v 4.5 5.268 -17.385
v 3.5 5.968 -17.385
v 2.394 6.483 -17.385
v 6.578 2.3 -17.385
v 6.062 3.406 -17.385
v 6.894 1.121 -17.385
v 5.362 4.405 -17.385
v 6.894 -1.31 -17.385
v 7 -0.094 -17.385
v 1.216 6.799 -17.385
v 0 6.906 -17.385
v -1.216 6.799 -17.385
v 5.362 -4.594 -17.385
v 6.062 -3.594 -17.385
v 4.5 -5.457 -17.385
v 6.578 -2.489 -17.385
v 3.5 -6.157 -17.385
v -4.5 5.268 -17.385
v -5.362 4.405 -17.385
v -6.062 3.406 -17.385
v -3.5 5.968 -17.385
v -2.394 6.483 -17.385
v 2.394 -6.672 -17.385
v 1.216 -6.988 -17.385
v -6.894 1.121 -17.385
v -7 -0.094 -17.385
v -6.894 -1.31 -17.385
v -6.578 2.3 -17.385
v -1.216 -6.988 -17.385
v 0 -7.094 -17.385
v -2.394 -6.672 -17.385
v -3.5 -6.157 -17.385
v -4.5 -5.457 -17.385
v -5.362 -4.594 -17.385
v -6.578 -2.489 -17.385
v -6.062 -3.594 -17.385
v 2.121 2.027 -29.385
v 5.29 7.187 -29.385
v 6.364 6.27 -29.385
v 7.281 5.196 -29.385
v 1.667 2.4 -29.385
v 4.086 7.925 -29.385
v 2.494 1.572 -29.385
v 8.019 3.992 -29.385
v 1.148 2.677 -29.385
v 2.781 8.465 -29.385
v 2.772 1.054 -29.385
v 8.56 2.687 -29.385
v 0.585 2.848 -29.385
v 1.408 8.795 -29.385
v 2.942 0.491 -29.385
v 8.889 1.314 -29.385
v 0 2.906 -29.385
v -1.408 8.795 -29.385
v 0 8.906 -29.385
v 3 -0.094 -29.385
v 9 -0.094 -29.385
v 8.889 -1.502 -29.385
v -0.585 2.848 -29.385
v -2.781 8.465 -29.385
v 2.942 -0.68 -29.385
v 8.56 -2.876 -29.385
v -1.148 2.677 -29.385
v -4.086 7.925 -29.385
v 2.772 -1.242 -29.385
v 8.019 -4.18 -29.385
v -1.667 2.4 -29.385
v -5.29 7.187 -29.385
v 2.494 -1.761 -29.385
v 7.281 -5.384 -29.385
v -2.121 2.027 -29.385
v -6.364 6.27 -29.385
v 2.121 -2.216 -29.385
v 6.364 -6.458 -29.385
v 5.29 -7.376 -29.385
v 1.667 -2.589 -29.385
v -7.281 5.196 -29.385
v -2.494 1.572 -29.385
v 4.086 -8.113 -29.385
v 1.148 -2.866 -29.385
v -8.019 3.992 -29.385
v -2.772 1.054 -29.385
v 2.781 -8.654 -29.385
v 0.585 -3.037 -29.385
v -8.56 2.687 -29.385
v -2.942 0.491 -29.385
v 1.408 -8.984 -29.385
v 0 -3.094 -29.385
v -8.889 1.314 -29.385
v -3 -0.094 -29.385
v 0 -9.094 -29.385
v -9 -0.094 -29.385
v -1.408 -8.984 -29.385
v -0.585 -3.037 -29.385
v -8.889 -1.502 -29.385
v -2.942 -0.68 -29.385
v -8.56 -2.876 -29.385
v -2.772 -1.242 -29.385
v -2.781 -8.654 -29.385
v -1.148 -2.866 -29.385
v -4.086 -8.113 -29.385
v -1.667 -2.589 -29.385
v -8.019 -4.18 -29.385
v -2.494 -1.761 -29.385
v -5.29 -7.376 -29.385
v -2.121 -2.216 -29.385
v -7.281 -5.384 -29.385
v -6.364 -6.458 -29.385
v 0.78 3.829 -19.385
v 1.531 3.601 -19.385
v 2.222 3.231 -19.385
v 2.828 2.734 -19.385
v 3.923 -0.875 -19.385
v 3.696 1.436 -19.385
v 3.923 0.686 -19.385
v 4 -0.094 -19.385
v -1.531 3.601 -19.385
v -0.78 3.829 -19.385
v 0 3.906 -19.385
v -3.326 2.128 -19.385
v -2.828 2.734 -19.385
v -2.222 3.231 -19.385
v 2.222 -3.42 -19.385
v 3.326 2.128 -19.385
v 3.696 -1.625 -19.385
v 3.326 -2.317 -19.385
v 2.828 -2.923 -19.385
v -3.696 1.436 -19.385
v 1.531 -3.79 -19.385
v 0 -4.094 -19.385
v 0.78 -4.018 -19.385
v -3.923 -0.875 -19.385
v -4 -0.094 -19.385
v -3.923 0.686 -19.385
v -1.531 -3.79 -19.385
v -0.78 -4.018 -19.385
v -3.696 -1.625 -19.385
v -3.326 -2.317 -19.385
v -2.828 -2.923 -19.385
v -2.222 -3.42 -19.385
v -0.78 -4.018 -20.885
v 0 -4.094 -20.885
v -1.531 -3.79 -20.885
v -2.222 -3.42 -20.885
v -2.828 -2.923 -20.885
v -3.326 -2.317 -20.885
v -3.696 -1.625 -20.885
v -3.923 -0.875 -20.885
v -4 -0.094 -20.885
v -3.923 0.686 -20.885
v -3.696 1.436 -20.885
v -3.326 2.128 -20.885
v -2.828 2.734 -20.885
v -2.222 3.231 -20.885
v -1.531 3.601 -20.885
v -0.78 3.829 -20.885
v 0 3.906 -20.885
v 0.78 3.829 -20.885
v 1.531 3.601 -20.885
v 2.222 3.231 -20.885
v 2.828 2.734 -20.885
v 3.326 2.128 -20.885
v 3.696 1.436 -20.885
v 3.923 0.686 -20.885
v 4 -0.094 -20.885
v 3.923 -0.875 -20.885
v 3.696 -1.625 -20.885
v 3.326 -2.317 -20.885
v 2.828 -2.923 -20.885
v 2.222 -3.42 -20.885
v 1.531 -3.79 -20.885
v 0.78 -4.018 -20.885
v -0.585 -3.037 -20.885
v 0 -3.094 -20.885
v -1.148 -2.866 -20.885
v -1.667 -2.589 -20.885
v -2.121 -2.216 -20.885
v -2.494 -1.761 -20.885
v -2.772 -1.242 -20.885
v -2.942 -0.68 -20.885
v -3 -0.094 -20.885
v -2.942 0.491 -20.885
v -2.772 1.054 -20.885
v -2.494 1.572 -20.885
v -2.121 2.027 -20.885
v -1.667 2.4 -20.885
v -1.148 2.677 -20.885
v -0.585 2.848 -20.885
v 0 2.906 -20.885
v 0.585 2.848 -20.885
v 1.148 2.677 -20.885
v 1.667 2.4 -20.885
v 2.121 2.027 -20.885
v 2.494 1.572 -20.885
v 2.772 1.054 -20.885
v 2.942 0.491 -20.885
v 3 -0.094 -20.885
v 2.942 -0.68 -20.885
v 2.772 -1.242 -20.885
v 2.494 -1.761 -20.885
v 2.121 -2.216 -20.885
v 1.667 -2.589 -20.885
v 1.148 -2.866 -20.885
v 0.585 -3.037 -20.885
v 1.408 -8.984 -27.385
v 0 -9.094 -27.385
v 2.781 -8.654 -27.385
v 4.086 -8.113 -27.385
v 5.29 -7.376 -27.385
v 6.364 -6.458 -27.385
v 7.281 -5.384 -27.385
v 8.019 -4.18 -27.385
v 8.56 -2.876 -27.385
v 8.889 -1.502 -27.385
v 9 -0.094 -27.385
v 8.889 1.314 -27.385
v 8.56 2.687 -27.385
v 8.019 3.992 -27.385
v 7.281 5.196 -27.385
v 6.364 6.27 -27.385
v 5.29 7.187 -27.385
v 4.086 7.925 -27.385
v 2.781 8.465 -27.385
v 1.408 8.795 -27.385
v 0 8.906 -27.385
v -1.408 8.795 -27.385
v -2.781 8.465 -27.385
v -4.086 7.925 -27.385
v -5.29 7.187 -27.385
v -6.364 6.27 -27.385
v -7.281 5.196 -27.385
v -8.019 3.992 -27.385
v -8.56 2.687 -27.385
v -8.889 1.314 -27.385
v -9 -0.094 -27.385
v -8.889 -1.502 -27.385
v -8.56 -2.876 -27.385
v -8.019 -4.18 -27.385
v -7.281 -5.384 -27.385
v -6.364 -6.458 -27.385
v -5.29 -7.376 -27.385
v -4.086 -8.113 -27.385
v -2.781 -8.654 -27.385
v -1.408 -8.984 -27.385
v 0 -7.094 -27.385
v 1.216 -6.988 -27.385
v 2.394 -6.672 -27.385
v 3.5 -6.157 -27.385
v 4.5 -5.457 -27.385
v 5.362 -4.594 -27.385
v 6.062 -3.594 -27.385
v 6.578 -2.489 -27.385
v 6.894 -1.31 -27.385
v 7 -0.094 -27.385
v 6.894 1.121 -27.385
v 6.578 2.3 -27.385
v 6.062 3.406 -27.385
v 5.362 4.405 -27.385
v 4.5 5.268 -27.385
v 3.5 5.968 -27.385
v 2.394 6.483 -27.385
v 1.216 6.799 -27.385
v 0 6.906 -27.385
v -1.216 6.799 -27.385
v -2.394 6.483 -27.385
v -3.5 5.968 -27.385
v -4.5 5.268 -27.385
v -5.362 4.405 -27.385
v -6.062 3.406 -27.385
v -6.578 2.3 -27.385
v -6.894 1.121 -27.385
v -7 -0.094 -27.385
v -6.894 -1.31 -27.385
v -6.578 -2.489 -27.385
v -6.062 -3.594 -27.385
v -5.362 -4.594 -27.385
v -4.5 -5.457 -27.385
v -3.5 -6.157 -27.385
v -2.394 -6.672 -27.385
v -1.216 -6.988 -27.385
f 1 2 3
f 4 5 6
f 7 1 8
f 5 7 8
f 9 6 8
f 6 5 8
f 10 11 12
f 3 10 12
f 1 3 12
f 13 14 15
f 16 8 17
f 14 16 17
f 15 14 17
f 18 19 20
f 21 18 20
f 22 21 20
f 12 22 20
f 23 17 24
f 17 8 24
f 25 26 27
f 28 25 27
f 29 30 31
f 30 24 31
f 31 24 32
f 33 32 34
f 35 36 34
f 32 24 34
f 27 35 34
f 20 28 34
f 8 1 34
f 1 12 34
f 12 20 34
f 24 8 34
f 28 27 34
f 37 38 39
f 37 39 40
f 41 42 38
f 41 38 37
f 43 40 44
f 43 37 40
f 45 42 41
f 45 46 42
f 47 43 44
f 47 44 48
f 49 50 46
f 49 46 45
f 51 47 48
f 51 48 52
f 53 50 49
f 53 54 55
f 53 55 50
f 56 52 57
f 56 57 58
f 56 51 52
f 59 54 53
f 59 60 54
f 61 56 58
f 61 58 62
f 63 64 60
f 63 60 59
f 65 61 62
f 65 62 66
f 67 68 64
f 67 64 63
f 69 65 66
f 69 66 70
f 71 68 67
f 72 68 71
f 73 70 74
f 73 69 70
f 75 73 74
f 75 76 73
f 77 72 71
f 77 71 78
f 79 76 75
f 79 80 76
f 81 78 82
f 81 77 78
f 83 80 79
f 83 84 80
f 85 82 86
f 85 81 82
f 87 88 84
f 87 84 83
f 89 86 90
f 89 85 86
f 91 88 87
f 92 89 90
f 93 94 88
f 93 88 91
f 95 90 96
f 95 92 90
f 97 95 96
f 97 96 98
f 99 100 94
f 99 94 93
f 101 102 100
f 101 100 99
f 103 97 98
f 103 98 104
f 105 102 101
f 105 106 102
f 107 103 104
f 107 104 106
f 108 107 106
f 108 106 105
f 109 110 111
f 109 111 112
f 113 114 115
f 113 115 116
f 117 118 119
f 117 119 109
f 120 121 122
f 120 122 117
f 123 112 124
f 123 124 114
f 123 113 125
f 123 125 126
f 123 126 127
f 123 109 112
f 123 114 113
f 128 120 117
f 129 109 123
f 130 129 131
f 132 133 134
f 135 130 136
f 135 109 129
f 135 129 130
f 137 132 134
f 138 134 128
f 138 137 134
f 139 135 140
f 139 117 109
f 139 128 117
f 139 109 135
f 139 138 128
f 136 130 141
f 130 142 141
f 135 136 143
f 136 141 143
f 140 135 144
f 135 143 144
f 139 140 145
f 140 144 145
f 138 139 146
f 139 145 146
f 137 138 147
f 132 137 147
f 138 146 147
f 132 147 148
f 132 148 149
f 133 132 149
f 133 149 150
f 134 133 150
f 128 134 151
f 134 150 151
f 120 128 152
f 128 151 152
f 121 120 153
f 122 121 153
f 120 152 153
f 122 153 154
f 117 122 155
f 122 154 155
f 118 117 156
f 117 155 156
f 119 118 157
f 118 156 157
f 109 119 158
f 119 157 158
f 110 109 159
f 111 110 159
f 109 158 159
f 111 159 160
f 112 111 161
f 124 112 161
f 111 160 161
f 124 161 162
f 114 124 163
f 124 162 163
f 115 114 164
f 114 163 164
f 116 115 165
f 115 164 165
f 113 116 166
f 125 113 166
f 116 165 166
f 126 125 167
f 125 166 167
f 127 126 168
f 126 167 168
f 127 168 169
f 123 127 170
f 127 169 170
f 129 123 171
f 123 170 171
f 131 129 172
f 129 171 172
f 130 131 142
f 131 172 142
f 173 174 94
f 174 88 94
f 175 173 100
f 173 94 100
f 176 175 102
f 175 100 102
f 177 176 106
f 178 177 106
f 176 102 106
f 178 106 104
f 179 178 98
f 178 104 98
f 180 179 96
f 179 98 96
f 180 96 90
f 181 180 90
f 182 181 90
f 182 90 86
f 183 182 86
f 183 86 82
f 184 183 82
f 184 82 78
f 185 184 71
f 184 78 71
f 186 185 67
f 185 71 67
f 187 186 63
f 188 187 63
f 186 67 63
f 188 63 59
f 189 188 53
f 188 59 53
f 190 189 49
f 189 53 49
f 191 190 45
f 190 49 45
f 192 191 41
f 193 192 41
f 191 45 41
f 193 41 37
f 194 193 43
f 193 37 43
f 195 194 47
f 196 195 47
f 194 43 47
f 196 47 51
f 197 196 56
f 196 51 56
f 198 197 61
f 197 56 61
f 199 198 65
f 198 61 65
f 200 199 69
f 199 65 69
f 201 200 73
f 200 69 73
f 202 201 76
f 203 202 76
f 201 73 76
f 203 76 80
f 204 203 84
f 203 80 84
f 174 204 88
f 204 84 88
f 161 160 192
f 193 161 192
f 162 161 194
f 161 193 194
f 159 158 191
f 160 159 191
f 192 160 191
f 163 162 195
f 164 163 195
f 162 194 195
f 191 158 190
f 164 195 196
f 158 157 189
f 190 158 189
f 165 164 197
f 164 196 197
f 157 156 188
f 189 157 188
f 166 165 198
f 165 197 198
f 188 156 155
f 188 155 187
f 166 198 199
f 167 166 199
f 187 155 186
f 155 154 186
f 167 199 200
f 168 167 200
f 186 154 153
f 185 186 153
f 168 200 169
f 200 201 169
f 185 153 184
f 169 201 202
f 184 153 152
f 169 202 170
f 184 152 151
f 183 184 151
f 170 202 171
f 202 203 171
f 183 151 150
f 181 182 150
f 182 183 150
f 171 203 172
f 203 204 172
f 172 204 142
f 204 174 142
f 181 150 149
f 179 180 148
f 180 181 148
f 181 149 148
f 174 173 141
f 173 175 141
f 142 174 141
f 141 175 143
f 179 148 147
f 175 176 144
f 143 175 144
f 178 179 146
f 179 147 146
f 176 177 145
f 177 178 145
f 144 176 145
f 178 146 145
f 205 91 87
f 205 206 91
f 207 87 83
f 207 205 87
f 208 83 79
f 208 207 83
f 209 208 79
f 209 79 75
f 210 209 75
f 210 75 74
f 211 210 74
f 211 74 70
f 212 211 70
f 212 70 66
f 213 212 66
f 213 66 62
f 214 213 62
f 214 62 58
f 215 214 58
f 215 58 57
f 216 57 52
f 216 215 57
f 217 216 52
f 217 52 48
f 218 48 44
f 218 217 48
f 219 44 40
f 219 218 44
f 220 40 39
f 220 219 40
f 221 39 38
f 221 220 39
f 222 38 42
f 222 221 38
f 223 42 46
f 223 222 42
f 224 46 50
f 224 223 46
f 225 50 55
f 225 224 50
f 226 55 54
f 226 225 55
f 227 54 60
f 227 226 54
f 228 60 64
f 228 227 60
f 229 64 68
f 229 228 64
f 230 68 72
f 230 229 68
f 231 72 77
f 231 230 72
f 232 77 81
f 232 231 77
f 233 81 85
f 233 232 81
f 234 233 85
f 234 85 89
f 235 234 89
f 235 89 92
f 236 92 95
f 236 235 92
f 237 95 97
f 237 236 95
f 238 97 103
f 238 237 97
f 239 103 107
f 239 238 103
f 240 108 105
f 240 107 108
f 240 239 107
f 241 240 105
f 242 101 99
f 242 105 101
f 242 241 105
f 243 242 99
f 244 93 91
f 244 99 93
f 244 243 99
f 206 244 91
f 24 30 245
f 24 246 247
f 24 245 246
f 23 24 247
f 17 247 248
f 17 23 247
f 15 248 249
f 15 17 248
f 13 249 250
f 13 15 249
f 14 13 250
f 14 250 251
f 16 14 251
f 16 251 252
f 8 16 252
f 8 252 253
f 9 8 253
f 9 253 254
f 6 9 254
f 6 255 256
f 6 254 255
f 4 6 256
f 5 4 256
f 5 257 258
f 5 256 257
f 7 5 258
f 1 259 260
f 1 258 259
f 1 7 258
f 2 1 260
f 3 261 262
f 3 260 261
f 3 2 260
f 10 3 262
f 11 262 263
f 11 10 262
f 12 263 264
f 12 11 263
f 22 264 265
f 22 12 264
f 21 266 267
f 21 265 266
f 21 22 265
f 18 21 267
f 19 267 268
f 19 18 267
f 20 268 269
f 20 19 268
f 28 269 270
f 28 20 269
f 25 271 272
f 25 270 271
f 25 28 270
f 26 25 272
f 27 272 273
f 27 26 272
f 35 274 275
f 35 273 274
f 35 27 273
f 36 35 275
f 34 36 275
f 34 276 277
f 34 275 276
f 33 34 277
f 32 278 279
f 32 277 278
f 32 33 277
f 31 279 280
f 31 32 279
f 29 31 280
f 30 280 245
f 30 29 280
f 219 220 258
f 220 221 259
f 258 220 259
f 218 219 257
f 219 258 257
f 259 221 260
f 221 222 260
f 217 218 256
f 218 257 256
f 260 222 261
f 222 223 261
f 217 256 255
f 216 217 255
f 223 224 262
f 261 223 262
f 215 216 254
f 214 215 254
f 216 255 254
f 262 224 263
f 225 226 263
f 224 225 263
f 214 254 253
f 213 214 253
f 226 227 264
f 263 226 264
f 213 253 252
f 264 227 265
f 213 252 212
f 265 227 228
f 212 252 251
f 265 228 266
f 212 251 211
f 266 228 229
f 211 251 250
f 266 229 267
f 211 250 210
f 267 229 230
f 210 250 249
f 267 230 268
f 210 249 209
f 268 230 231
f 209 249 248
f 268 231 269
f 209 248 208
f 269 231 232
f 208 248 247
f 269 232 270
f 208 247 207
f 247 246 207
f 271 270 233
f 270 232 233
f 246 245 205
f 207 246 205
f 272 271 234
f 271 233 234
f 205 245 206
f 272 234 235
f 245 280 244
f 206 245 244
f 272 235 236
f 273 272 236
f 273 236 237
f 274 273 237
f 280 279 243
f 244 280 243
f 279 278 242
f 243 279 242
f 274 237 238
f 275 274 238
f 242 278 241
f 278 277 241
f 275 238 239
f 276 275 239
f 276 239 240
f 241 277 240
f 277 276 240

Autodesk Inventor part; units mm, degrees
ref_plane "YZ Plane" through (0, 0, 0) normal (1, 0, 0) x (0, 1, 0)
ref_plane "XZ Plane" through (0, 0, 0) normal (0, 1, 0) x (-1, 0, 0)
ref_plane "XY Plane" through (0, 0, 0) normal (0, 0, 1) x (1, 0, 0)
sketch "Эскиз1" plane through (0, 0, 0) normal (1, 0, 0) x (0, 1, 0)
  line L0 (-0.0944, -29.3854) -> (-9.0944, -29.3854)
  line L1 (-9.0944, -29.3854) -> (-9.0944, -27.3854)
  line L2 (-9.0944, -27.3854) -> (-7.0944, -27.3854)
  line L3 (-7.0944, -27.3854) -> (-7.0944, -17.3854)
  line L4 (-7.0944, -17.3854) -> (-0.0944, -17.3854)
  line L5 (-0.0944, -17.3854) -> (-0.0944, -19.3854)
  line L6 (-0.0944, -19.3854) -> (-4.0944, -19.3854)
  line L7 (-4.0944, -19.3854) -> (-4.0944, -20.8854)
  line L8 (-4.0944, -20.8854) -> (-3.0944, -20.8854)
  line L9 (-3.0944, -20.8854) -> (-3.0944, -29.3854)
  line L10 (-0.0944, -15.3854) -> (-0.0944, -31.3854)
  point P0 (0, 0)
  point P1 (-105.6045, -1.7251)
revolve "Вращение1" add sketch "Эскиз1" angle 360 about axis through (0, -0.0944, -15.3854) along (0, 0, -1) contours L0 L1 L2 L3 L4 L5 L6 L7 L8 L9
equation "\"Радиус_гибки\" = Толщина"
equation "\"Ширина_просечки\" = Толщина"
equation "\"Глубина_просечки\" = 0.5 * Толщина"
equation "\"Размер_просечки\" = 4 * Толщина"
equation "\"Мин_остаток\" = 2 * Толщина"
equation "\"Радиус_перехода\" = Радиус_гибки"
equation "\"Радиус_Якоби\" = Радиус_гибки"
equation "\"Размер_зазора\" = Толщина"
equation "\"Толщина\" = 0.5"
